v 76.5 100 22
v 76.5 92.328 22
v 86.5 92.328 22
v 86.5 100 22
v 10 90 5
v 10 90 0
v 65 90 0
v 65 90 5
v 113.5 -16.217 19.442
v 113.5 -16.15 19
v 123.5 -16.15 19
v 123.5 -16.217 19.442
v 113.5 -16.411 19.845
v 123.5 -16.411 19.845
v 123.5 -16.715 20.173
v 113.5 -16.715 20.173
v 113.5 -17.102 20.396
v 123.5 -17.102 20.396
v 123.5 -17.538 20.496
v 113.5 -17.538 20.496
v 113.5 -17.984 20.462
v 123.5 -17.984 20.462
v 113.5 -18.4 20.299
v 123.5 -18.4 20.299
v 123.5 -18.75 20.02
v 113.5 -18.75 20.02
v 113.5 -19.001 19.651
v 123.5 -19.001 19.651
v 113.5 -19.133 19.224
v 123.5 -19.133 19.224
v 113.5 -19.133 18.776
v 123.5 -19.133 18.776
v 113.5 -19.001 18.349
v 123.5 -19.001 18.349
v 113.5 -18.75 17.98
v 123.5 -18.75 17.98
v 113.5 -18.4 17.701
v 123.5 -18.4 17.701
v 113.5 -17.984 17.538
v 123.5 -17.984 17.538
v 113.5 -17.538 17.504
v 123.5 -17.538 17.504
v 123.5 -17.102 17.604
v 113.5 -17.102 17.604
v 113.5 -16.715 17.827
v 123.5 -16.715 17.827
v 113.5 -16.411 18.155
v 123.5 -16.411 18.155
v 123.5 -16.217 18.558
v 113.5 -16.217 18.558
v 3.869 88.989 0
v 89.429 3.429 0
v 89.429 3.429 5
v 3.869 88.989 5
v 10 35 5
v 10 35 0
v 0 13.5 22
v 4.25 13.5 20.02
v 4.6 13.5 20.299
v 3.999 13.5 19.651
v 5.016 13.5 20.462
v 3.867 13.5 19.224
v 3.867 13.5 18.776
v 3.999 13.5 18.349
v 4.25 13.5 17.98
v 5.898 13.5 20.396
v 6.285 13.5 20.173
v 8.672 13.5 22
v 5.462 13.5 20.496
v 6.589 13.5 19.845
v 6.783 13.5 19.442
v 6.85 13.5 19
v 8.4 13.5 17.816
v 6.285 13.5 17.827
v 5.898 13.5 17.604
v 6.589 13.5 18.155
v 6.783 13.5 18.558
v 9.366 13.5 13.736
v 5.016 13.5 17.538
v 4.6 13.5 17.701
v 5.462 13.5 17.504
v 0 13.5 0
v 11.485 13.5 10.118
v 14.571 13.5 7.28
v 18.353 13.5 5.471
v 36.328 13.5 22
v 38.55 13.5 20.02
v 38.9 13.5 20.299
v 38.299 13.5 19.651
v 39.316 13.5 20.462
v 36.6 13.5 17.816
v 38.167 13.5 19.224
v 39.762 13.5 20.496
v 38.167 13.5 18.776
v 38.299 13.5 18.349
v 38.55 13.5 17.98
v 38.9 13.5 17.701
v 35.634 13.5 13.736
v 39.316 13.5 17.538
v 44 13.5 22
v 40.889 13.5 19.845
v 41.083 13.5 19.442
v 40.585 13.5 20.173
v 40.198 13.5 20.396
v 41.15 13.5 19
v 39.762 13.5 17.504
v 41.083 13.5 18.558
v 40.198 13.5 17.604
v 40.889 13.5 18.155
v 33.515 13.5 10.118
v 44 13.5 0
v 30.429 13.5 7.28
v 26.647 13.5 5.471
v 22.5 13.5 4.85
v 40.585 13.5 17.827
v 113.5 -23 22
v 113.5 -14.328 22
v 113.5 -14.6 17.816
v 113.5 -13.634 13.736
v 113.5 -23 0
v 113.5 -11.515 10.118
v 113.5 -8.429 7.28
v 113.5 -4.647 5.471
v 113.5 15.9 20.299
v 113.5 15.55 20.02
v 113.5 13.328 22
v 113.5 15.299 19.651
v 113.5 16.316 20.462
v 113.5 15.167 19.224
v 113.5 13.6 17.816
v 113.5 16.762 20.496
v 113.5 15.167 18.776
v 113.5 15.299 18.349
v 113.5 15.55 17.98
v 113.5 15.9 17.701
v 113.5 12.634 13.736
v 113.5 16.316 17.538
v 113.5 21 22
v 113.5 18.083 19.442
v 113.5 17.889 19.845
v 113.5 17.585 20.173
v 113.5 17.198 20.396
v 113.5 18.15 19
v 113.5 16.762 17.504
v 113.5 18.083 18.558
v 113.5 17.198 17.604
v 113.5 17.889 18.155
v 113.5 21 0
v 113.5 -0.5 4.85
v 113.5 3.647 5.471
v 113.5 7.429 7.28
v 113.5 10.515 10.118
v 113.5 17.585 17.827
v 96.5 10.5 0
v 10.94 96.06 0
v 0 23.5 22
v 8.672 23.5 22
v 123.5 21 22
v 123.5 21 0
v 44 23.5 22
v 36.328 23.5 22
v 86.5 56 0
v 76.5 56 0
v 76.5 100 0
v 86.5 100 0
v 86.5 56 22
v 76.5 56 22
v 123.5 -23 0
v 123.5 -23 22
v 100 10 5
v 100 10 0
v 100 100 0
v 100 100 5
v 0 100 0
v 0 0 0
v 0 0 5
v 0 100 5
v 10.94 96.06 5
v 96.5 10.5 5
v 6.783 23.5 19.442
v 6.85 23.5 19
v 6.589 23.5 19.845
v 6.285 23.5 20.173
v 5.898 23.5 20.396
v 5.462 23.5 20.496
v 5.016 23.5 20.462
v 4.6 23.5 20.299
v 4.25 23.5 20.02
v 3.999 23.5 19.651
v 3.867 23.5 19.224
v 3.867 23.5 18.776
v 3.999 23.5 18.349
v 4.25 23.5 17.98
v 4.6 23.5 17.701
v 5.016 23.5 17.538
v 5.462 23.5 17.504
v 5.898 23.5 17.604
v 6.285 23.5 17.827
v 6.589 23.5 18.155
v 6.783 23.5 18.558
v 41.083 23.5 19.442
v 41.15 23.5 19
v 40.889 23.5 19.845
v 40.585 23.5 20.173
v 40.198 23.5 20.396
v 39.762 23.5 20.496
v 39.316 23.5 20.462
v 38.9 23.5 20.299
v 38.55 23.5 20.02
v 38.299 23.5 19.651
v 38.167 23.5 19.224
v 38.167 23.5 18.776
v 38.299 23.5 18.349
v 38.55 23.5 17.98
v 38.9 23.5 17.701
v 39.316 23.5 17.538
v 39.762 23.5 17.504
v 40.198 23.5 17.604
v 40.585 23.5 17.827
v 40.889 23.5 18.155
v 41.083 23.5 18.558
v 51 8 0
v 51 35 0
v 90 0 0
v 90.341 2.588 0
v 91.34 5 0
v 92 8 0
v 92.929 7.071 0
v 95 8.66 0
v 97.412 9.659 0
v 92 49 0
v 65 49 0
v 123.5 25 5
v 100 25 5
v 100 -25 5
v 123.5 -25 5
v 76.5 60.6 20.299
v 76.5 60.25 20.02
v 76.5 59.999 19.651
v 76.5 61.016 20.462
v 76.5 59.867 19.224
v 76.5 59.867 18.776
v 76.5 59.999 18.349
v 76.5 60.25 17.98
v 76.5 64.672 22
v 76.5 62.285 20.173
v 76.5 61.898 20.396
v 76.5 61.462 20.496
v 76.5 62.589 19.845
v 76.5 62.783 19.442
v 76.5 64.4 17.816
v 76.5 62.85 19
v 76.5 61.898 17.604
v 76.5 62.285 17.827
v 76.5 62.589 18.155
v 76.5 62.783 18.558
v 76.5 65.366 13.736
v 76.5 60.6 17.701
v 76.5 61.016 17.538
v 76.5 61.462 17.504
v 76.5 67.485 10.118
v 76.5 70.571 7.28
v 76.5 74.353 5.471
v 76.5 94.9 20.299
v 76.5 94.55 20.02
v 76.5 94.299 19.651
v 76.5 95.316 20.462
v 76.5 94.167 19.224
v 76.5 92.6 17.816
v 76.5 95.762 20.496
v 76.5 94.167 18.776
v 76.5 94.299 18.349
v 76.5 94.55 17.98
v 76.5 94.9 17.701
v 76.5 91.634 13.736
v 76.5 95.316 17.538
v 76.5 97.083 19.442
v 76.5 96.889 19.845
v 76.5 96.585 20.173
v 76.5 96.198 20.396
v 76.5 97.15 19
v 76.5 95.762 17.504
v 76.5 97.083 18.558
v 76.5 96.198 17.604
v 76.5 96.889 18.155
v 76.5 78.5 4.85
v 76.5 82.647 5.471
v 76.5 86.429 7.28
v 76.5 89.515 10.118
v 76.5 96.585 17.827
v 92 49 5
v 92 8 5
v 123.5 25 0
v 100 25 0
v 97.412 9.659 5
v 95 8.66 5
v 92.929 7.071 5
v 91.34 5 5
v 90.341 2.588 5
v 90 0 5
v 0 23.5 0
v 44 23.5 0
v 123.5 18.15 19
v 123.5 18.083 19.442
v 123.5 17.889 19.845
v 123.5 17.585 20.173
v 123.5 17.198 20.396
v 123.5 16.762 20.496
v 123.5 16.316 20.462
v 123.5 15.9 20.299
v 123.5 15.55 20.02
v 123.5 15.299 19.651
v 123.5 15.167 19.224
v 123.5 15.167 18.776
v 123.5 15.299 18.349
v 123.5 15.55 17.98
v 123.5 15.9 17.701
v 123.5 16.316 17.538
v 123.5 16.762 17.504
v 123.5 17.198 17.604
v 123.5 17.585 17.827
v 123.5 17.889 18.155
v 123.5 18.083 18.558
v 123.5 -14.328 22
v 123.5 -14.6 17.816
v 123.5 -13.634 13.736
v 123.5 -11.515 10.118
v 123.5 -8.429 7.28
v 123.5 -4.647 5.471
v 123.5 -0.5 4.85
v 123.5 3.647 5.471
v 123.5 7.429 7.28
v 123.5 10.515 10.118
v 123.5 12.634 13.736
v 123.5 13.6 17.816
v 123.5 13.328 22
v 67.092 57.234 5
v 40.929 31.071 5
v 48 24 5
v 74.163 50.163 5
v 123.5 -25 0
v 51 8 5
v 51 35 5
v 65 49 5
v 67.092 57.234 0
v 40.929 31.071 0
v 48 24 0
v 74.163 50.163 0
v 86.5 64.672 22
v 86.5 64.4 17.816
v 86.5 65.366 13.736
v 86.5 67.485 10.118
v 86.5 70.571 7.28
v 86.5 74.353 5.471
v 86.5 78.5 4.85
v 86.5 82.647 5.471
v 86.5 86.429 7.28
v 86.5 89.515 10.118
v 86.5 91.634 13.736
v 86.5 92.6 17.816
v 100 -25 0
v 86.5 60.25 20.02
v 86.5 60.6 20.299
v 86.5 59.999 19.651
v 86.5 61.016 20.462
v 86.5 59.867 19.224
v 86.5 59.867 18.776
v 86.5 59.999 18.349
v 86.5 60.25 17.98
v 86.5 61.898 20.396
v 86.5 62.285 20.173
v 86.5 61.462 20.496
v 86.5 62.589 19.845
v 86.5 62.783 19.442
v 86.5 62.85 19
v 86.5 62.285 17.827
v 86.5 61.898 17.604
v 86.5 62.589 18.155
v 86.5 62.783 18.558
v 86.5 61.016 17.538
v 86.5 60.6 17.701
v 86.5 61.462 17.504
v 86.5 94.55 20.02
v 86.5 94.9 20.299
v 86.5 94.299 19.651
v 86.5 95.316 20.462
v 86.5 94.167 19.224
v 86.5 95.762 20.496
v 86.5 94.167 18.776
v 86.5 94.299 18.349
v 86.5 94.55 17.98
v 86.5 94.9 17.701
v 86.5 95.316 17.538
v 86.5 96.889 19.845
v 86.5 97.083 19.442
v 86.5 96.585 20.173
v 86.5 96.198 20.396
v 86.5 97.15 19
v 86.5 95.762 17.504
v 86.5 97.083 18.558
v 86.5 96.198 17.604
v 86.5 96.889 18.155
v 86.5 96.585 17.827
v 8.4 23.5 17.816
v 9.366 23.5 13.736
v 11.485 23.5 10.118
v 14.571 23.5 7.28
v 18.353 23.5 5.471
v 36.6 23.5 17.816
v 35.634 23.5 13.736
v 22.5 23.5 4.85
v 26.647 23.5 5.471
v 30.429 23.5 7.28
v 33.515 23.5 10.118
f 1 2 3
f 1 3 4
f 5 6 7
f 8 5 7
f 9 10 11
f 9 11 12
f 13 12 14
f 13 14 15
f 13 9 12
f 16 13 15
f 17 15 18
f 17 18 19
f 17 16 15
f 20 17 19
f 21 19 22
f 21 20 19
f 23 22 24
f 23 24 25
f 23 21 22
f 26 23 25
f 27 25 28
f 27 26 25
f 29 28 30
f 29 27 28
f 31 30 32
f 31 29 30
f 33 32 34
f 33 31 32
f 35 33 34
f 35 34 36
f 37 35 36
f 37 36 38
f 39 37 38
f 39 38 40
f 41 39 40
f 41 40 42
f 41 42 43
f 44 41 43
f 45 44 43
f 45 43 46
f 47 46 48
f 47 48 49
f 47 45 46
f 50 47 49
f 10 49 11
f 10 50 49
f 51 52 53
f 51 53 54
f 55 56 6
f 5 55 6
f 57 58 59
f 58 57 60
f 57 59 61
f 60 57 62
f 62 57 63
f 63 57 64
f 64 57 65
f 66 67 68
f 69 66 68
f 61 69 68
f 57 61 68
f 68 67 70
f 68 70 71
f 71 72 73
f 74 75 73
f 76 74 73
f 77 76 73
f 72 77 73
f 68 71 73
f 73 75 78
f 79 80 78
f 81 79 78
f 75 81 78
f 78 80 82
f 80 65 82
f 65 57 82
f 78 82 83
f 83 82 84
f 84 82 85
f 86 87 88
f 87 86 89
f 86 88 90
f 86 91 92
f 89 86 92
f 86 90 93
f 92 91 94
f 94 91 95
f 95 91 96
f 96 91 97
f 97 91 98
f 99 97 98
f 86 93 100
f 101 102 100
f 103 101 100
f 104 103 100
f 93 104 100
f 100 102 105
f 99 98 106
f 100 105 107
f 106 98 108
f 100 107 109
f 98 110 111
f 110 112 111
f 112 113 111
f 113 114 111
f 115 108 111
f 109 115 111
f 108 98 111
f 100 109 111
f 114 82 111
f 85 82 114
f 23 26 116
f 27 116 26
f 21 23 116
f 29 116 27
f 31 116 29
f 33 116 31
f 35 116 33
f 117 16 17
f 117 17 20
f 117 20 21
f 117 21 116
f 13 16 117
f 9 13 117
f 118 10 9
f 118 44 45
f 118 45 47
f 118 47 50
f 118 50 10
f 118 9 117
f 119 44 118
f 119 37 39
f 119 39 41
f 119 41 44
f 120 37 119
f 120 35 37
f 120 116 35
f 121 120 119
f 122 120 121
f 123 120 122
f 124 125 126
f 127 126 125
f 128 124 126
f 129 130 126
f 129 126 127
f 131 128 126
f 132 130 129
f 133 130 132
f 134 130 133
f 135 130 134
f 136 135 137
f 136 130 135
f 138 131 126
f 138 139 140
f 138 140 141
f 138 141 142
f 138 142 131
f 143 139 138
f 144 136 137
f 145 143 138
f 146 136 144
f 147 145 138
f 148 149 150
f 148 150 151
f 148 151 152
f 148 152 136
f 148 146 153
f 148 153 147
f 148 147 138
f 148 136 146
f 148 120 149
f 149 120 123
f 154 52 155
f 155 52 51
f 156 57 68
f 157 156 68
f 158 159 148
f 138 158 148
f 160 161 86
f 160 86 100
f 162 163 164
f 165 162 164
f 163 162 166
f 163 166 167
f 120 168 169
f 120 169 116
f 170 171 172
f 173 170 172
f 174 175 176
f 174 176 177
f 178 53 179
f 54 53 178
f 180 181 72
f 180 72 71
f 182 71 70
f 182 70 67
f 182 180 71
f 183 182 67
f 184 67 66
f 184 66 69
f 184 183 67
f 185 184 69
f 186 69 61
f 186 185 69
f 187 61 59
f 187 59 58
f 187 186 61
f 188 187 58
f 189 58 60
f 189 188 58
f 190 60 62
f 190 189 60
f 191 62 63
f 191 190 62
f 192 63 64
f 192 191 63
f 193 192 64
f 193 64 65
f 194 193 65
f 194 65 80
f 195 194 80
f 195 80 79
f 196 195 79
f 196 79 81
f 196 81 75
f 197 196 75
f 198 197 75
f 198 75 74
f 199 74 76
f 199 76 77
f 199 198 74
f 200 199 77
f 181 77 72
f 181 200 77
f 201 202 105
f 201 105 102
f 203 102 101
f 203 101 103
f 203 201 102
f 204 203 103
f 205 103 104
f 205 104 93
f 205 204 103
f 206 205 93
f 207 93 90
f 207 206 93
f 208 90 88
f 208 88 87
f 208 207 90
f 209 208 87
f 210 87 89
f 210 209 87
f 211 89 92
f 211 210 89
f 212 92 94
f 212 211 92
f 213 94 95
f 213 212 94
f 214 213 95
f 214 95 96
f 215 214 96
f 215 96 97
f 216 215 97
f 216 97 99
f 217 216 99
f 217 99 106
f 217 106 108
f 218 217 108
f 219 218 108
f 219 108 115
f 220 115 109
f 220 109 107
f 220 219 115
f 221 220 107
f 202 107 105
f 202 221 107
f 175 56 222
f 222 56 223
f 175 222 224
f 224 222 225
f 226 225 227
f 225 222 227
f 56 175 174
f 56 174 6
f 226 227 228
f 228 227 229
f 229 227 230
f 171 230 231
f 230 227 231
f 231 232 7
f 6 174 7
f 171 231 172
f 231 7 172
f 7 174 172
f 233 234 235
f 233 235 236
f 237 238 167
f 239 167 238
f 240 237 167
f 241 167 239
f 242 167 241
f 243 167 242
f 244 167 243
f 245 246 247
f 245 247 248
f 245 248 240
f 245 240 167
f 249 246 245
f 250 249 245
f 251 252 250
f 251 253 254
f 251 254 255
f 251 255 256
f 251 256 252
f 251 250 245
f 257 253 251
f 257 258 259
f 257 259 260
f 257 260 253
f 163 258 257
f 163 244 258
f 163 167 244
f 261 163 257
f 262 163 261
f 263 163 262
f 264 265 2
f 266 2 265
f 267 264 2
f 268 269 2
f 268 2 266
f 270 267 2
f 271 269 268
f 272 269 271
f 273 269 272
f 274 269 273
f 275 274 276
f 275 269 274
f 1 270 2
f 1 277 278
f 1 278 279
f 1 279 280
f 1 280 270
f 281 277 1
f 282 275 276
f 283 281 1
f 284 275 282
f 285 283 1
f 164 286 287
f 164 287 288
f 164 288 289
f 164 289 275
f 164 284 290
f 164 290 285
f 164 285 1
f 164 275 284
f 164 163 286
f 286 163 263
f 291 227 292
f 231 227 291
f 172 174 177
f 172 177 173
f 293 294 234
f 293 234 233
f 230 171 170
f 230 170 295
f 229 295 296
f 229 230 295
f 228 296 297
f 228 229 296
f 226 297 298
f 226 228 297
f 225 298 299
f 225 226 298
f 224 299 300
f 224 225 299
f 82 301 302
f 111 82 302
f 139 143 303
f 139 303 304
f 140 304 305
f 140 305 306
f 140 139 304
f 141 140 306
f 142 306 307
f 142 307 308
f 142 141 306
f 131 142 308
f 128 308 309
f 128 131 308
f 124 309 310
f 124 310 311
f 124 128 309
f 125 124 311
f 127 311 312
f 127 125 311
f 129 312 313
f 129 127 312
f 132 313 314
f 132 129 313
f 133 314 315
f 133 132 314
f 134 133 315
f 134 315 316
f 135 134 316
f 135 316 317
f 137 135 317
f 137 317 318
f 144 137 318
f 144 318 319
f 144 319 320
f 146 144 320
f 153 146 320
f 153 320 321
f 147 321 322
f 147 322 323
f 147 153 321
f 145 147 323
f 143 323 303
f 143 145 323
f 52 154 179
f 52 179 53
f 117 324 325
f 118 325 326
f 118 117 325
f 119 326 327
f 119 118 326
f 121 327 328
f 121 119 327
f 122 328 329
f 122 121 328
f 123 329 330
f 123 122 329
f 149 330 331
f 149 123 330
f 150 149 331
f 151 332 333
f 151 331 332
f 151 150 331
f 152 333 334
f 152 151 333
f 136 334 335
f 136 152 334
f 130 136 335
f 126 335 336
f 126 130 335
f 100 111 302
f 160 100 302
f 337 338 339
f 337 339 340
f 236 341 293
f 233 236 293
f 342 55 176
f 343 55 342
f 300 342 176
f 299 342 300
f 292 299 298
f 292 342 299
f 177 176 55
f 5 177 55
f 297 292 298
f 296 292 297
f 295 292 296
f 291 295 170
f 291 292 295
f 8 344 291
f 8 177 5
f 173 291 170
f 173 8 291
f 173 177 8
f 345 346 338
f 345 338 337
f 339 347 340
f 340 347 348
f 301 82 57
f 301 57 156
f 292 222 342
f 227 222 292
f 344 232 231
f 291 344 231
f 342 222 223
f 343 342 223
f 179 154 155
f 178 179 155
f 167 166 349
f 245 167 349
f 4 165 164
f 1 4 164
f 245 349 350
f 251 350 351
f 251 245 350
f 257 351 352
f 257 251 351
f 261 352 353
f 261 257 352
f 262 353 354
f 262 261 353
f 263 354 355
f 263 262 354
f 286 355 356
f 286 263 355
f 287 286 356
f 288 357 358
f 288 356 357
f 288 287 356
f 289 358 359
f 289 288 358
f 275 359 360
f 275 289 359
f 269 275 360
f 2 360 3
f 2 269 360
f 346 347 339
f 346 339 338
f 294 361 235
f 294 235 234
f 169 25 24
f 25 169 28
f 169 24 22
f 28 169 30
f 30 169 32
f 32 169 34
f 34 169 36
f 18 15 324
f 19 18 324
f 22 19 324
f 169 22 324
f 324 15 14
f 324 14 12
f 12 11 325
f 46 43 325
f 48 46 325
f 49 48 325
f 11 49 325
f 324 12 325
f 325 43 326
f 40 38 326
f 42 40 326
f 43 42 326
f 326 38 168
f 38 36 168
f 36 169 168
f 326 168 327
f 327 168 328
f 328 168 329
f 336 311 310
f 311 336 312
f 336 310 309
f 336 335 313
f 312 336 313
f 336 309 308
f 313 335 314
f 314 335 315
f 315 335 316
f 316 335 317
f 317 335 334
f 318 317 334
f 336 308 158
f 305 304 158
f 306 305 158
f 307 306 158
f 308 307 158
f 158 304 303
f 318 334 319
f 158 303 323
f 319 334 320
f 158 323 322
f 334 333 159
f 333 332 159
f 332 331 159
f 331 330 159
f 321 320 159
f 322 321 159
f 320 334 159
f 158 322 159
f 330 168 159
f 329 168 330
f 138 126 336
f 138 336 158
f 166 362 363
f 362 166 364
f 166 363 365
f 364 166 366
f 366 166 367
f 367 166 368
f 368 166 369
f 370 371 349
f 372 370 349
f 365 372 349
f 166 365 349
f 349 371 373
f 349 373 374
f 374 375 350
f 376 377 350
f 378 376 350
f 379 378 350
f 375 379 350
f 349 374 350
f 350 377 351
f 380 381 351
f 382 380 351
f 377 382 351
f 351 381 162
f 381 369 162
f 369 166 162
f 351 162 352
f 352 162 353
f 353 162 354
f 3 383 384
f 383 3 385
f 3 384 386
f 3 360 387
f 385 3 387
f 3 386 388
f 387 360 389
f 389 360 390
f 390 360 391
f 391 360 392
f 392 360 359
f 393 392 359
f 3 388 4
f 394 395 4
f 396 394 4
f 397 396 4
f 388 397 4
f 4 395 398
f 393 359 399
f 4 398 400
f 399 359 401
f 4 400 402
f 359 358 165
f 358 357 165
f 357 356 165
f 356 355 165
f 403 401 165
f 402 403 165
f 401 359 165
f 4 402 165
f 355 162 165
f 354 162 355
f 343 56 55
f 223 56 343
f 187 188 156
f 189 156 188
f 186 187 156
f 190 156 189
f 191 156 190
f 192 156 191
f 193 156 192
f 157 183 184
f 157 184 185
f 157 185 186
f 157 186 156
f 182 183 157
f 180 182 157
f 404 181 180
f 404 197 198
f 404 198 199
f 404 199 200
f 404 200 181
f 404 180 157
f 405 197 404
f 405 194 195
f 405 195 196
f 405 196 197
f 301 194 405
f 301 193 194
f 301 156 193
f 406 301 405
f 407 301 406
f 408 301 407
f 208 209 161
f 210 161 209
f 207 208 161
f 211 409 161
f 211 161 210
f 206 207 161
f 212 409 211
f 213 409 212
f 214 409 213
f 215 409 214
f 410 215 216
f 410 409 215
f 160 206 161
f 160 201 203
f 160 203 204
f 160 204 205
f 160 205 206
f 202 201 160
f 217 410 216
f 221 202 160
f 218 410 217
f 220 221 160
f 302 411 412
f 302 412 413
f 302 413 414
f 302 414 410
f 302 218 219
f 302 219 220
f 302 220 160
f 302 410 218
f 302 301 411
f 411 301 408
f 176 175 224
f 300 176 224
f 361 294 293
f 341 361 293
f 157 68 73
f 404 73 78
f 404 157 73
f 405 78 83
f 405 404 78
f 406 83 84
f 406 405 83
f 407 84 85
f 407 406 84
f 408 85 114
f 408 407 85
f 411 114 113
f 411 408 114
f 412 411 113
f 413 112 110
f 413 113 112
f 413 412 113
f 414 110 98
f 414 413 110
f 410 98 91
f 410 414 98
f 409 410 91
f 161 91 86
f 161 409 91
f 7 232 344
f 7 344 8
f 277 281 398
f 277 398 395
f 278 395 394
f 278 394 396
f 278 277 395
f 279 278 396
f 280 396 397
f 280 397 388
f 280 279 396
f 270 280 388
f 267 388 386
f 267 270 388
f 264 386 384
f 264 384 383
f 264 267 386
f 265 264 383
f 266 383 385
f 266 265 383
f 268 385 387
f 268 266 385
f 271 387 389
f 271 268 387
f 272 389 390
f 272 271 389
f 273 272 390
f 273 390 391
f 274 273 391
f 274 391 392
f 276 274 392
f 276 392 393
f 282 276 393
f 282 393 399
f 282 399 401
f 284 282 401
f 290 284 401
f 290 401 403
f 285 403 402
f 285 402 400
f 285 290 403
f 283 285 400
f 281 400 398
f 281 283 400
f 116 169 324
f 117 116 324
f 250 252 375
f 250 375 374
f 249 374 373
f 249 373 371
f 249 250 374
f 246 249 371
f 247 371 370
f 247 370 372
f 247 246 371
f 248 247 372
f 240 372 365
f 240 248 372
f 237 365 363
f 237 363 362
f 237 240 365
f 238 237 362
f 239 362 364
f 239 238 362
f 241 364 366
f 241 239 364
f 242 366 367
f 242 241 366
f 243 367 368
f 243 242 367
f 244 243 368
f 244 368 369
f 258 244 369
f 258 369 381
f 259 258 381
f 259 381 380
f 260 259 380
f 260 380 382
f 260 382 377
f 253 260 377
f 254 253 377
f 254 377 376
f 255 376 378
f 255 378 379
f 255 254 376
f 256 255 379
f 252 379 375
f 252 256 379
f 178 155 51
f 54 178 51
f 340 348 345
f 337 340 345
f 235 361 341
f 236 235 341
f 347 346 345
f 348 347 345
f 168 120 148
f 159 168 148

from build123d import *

# Parameters (mm, degrees)
CYLINDER001_R                = 1.5
CYLINDER001_DEPTH            = 10
CYLINDER001_ROLL_ANGLE       = 90
CYLINDER001001_R             = 1.5
CYLINDER001001_DEPTH         = 10
CYLINDER001001_ROLL_ANGLE    = 90
CYLINDER_R                   = 14.15
CYLINDER_DEPTH               = 10
CYLINDER_ROLL_ANGLE          = 90
BOX001_W                     = 44
BOX001_H                     = 10
BOX001_DEPTH                 = 22
CUT002001_PLACEMENT_ANGLE    = 90
BOX002_W                     = 23.5
BOX002_H                     = 50
BOX002_DEPTH                 = 5
CUT002001001_PLACEMENT_ANGLE = 90
BOX004_W                     = 41
BOX004_H                     = 41
BOX004_DEPTH                 = 10
BOX003_W                     = 55
BOX003_H                     = 55
BOX003_DEPTH                 = 10
CYLINDER001002_R             = 10
CYLINDER001002_DEPTH         = 10
BOX_W                        = 100
BOX_H                        = 100
BOX_DEPTH                    = 5
BOX005_W                     = 121
BOX005_H                     = 10
BOX005_DEPTH                 = 5
BOX005_PLACEMENT_ANGLE       = 135.000066
BOX006_W                     = 37
BOX006_H                     = 10
BOX006_DEPTH                 = 5
BOX006_PLACEMENT_ANGLE       = 44.999934


with BuildPart() as cylinder001:
    # Cylinder001 → Cylinder001 (new body)
    with BuildSketch(Plane.XY):
        Circle(CYLINDER001_R)
    extrude(amount=CYLINDER001_DEPTH)


with BuildPart() as cylinder001_1:
    # Cylinder001 roll: moved
    add(cylinder001.part.rotate(Axis((0, 0, 0), (1, 0, 0)), CYLINDER001_ROLL_ANGLE))


with BuildPart() as cylinder001_2:
    # Cylinder001 placement: moved
    add(cylinder001_1.part.moved(Location((5.35, 23.5, 19))))


with BuildPart() as cylinder001001:
    # Cylinder001001 → Cylinder001001 (new body)
    with BuildSketch(Plane.XY):
        Circle(CYLINDER001001_R)
    extrude(amount=CYLINDER001001_DEPTH)


with BuildPart() as cylinder001001_1:
    # Cylinder001001 roll: moved
    add(cylinder001001.part.rotate(Axis((0, 0, 0), (1, 0, 0)), CYLINDER001001_ROLL_ANGLE))


with BuildPart() as cylinder001001_2:
    # Cylinder001001 placement: moved
    add(cylinder001001_1.part.moved(Location((39.65, 23.5, 19))))


with BuildPart() as cylinder:
    # Cylinder → Cylinder (new body)
    with BuildSketch(Plane.XY):
        Circle(CYLINDER_R)
    extrude(amount=CYLINDER_DEPTH)


with BuildPart() as cylinder_1:
    # Cylinder roll: moved
    add(cylinder.part.rotate(Axis((0, 0, 0), (1, 0, 0)), CYLINDER_ROLL_ANGLE))


with BuildPart() as cylinder_2:
    # Cylinder placement: moved
    add(cylinder_1.part.moved(Location((22.5, 23.5, 19))))


with BuildPart() as cut001:
    # Box001 → Box001 (new body)
    with BuildSketch(Plane(origin=(0, 13.5, 0), x_dir=(1, 0, 0), z_dir=(0, 0, 1))):
        with Locations((22, 5)):
            Rectangle(BOX001_W, BOX001_H)
    extrude(amount=BOX001_DEPTH)

    # Cut: cut Cylinder
    add(cylinder_2.part, mode=Mode.SUBTRACT)

    # Cut001: cut Cylinder001001
    add(cylinder001001_2.part, mode=Mode.SUBTRACT)


with BuildPart() as cut002:
    # Cut002 base: copy of Cut001
    add(cut001.part)

    # Cut002: cut Cylinder001
    add(cylinder001_2.part, mode=Mode.SUBTRACT)


with BuildPart() as cut002001:
    # Cut002001 base: copy of Cut001
    add(cut001.part)

    # Cut002001: cut Cylinder001
    add(cylinder001_2.part, mode=Mode.SUBTRACT)


with BuildPart() as cut002001_1:
    # Cut002001 placement: moved
    add(cut002001.part.moved(Location((100, 56, 0))).rotate(Axis((100, 56, 0), (0, 0, 1)), CUT002001_PLACEMENT_ANGLE))


with BuildPart() as box002:
    # Box002 → Box002 (new body)
    with BuildSketch(Plane(origin=(100, -25, 0), x_dir=(1, 0, 0), z_dir=(0, 0, 1))):
        with Locations((11.75, 25)):
            Rectangle(BOX002_W, BOX002_H)
    extrude(amount=BOX002_DEPTH)


with BuildPart() as cut002001001:
    # Cut002001001 base: copy of Cut001
    add(cut001.part)

    # Cut002001001: cut Cylinder001
    add(cylinder001_2.part, mode=Mode.SUBTRACT)


with BuildPart() as cut002001001_1:
    # Cut002001001 placement: moved
    add(cut002001001.part.moved(Location((137, -23, 0))).rotate(Axis((137, -23, 0), (0, 0, 1)), CUT002001001_PLACEMENT_ANGLE))


with BuildPart() as box004:
    # Box004 → Box004 (new body)
    with BuildSketch(Plane(origin=(51, 8, 0), x_dir=(1, 0, 0), z_dir=(0, 0, 1))):
        with Locations((20.5, 20.5)):
            Rectangle(BOX004_W, BOX004_H)
    extrude(amount=BOX004_DEPTH)


with BuildPart() as box003:
    # Box003 → Box003 (new body)
    with BuildSketch(Plane(origin=(10, 35, 0), x_dir=(1, 0, 0), z_dir=(0, 0, 1))):
        with Locations((27.5, 27.5)):
            Rectangle(BOX003_W, BOX003_H)
    extrude(amount=BOX003_DEPTH)


with BuildPart() as cylinder001002:
    # Cylinder001002 → Cylinder001002 (new body)
    with BuildSketch(Plane(origin=(100, 0, 0), x_dir=(1, 0, 0), z_dir=(0, 0, 1))):
        Circle(CYLINDER001002_R)
    extrude(amount=CYLINDER001002_DEPTH)


with BuildPart() as cut002001004:
    # Box → Box (new body)
    with BuildSketch(Plane.XY):
        with Locations((50, 50)):
            Rectangle(BOX_W, BOX_H)
    extrude(amount=BOX_DEPTH)

    # Cut002001002: cut Cylinder001002
    add(cylinder001002.part, mode=Mode.SUBTRACT)

    # Cut002001003: cut Box003
    add(box003.part, mode=Mode.SUBTRACT)

    # Cut002001004: cut Box004
    add(box004.part, mode=Mode.SUBTRACT)


with BuildPart() as box005:
    # Box005 → Box005 (new body)
    with BuildSketch(Plane.XY):
        with Locations((60.5, 5)):
            Rectangle(BOX005_W, BOX005_H)
    extrude(amount=BOX005_DEPTH)


with BuildPart() as box005_1:
    # Box005 placement: moved
    add(box005.part.moved(Location((96.5, 10.5, 0))).rotate(Axis((96.5, 10.5, 0), (0, 0, 1)), BOX005_PLACEMENT_ANGLE))


with BuildPart() as box006:
    # Box006 → Box006 (new body)
    with BuildSketch(Plane.XY):
        with Locations((18.5, 5)):
            Rectangle(BOX006_W, BOX006_H)
    extrude(amount=BOX006_DEPTH)


with BuildPart() as box006_1:
    # Box006 placement: moved
    add(box006.part.moved(Location((48, 24, 0))).rotate(Axis((48, 24, 0), (0, 0, 1)), BOX006_PLACEMENT_ANGLE))


solid = Compound([cut002.part, cut002001_1.part, box002.part, cut002001001_1.part, cut002001004.part, box005_1.part, box006_1.part])
